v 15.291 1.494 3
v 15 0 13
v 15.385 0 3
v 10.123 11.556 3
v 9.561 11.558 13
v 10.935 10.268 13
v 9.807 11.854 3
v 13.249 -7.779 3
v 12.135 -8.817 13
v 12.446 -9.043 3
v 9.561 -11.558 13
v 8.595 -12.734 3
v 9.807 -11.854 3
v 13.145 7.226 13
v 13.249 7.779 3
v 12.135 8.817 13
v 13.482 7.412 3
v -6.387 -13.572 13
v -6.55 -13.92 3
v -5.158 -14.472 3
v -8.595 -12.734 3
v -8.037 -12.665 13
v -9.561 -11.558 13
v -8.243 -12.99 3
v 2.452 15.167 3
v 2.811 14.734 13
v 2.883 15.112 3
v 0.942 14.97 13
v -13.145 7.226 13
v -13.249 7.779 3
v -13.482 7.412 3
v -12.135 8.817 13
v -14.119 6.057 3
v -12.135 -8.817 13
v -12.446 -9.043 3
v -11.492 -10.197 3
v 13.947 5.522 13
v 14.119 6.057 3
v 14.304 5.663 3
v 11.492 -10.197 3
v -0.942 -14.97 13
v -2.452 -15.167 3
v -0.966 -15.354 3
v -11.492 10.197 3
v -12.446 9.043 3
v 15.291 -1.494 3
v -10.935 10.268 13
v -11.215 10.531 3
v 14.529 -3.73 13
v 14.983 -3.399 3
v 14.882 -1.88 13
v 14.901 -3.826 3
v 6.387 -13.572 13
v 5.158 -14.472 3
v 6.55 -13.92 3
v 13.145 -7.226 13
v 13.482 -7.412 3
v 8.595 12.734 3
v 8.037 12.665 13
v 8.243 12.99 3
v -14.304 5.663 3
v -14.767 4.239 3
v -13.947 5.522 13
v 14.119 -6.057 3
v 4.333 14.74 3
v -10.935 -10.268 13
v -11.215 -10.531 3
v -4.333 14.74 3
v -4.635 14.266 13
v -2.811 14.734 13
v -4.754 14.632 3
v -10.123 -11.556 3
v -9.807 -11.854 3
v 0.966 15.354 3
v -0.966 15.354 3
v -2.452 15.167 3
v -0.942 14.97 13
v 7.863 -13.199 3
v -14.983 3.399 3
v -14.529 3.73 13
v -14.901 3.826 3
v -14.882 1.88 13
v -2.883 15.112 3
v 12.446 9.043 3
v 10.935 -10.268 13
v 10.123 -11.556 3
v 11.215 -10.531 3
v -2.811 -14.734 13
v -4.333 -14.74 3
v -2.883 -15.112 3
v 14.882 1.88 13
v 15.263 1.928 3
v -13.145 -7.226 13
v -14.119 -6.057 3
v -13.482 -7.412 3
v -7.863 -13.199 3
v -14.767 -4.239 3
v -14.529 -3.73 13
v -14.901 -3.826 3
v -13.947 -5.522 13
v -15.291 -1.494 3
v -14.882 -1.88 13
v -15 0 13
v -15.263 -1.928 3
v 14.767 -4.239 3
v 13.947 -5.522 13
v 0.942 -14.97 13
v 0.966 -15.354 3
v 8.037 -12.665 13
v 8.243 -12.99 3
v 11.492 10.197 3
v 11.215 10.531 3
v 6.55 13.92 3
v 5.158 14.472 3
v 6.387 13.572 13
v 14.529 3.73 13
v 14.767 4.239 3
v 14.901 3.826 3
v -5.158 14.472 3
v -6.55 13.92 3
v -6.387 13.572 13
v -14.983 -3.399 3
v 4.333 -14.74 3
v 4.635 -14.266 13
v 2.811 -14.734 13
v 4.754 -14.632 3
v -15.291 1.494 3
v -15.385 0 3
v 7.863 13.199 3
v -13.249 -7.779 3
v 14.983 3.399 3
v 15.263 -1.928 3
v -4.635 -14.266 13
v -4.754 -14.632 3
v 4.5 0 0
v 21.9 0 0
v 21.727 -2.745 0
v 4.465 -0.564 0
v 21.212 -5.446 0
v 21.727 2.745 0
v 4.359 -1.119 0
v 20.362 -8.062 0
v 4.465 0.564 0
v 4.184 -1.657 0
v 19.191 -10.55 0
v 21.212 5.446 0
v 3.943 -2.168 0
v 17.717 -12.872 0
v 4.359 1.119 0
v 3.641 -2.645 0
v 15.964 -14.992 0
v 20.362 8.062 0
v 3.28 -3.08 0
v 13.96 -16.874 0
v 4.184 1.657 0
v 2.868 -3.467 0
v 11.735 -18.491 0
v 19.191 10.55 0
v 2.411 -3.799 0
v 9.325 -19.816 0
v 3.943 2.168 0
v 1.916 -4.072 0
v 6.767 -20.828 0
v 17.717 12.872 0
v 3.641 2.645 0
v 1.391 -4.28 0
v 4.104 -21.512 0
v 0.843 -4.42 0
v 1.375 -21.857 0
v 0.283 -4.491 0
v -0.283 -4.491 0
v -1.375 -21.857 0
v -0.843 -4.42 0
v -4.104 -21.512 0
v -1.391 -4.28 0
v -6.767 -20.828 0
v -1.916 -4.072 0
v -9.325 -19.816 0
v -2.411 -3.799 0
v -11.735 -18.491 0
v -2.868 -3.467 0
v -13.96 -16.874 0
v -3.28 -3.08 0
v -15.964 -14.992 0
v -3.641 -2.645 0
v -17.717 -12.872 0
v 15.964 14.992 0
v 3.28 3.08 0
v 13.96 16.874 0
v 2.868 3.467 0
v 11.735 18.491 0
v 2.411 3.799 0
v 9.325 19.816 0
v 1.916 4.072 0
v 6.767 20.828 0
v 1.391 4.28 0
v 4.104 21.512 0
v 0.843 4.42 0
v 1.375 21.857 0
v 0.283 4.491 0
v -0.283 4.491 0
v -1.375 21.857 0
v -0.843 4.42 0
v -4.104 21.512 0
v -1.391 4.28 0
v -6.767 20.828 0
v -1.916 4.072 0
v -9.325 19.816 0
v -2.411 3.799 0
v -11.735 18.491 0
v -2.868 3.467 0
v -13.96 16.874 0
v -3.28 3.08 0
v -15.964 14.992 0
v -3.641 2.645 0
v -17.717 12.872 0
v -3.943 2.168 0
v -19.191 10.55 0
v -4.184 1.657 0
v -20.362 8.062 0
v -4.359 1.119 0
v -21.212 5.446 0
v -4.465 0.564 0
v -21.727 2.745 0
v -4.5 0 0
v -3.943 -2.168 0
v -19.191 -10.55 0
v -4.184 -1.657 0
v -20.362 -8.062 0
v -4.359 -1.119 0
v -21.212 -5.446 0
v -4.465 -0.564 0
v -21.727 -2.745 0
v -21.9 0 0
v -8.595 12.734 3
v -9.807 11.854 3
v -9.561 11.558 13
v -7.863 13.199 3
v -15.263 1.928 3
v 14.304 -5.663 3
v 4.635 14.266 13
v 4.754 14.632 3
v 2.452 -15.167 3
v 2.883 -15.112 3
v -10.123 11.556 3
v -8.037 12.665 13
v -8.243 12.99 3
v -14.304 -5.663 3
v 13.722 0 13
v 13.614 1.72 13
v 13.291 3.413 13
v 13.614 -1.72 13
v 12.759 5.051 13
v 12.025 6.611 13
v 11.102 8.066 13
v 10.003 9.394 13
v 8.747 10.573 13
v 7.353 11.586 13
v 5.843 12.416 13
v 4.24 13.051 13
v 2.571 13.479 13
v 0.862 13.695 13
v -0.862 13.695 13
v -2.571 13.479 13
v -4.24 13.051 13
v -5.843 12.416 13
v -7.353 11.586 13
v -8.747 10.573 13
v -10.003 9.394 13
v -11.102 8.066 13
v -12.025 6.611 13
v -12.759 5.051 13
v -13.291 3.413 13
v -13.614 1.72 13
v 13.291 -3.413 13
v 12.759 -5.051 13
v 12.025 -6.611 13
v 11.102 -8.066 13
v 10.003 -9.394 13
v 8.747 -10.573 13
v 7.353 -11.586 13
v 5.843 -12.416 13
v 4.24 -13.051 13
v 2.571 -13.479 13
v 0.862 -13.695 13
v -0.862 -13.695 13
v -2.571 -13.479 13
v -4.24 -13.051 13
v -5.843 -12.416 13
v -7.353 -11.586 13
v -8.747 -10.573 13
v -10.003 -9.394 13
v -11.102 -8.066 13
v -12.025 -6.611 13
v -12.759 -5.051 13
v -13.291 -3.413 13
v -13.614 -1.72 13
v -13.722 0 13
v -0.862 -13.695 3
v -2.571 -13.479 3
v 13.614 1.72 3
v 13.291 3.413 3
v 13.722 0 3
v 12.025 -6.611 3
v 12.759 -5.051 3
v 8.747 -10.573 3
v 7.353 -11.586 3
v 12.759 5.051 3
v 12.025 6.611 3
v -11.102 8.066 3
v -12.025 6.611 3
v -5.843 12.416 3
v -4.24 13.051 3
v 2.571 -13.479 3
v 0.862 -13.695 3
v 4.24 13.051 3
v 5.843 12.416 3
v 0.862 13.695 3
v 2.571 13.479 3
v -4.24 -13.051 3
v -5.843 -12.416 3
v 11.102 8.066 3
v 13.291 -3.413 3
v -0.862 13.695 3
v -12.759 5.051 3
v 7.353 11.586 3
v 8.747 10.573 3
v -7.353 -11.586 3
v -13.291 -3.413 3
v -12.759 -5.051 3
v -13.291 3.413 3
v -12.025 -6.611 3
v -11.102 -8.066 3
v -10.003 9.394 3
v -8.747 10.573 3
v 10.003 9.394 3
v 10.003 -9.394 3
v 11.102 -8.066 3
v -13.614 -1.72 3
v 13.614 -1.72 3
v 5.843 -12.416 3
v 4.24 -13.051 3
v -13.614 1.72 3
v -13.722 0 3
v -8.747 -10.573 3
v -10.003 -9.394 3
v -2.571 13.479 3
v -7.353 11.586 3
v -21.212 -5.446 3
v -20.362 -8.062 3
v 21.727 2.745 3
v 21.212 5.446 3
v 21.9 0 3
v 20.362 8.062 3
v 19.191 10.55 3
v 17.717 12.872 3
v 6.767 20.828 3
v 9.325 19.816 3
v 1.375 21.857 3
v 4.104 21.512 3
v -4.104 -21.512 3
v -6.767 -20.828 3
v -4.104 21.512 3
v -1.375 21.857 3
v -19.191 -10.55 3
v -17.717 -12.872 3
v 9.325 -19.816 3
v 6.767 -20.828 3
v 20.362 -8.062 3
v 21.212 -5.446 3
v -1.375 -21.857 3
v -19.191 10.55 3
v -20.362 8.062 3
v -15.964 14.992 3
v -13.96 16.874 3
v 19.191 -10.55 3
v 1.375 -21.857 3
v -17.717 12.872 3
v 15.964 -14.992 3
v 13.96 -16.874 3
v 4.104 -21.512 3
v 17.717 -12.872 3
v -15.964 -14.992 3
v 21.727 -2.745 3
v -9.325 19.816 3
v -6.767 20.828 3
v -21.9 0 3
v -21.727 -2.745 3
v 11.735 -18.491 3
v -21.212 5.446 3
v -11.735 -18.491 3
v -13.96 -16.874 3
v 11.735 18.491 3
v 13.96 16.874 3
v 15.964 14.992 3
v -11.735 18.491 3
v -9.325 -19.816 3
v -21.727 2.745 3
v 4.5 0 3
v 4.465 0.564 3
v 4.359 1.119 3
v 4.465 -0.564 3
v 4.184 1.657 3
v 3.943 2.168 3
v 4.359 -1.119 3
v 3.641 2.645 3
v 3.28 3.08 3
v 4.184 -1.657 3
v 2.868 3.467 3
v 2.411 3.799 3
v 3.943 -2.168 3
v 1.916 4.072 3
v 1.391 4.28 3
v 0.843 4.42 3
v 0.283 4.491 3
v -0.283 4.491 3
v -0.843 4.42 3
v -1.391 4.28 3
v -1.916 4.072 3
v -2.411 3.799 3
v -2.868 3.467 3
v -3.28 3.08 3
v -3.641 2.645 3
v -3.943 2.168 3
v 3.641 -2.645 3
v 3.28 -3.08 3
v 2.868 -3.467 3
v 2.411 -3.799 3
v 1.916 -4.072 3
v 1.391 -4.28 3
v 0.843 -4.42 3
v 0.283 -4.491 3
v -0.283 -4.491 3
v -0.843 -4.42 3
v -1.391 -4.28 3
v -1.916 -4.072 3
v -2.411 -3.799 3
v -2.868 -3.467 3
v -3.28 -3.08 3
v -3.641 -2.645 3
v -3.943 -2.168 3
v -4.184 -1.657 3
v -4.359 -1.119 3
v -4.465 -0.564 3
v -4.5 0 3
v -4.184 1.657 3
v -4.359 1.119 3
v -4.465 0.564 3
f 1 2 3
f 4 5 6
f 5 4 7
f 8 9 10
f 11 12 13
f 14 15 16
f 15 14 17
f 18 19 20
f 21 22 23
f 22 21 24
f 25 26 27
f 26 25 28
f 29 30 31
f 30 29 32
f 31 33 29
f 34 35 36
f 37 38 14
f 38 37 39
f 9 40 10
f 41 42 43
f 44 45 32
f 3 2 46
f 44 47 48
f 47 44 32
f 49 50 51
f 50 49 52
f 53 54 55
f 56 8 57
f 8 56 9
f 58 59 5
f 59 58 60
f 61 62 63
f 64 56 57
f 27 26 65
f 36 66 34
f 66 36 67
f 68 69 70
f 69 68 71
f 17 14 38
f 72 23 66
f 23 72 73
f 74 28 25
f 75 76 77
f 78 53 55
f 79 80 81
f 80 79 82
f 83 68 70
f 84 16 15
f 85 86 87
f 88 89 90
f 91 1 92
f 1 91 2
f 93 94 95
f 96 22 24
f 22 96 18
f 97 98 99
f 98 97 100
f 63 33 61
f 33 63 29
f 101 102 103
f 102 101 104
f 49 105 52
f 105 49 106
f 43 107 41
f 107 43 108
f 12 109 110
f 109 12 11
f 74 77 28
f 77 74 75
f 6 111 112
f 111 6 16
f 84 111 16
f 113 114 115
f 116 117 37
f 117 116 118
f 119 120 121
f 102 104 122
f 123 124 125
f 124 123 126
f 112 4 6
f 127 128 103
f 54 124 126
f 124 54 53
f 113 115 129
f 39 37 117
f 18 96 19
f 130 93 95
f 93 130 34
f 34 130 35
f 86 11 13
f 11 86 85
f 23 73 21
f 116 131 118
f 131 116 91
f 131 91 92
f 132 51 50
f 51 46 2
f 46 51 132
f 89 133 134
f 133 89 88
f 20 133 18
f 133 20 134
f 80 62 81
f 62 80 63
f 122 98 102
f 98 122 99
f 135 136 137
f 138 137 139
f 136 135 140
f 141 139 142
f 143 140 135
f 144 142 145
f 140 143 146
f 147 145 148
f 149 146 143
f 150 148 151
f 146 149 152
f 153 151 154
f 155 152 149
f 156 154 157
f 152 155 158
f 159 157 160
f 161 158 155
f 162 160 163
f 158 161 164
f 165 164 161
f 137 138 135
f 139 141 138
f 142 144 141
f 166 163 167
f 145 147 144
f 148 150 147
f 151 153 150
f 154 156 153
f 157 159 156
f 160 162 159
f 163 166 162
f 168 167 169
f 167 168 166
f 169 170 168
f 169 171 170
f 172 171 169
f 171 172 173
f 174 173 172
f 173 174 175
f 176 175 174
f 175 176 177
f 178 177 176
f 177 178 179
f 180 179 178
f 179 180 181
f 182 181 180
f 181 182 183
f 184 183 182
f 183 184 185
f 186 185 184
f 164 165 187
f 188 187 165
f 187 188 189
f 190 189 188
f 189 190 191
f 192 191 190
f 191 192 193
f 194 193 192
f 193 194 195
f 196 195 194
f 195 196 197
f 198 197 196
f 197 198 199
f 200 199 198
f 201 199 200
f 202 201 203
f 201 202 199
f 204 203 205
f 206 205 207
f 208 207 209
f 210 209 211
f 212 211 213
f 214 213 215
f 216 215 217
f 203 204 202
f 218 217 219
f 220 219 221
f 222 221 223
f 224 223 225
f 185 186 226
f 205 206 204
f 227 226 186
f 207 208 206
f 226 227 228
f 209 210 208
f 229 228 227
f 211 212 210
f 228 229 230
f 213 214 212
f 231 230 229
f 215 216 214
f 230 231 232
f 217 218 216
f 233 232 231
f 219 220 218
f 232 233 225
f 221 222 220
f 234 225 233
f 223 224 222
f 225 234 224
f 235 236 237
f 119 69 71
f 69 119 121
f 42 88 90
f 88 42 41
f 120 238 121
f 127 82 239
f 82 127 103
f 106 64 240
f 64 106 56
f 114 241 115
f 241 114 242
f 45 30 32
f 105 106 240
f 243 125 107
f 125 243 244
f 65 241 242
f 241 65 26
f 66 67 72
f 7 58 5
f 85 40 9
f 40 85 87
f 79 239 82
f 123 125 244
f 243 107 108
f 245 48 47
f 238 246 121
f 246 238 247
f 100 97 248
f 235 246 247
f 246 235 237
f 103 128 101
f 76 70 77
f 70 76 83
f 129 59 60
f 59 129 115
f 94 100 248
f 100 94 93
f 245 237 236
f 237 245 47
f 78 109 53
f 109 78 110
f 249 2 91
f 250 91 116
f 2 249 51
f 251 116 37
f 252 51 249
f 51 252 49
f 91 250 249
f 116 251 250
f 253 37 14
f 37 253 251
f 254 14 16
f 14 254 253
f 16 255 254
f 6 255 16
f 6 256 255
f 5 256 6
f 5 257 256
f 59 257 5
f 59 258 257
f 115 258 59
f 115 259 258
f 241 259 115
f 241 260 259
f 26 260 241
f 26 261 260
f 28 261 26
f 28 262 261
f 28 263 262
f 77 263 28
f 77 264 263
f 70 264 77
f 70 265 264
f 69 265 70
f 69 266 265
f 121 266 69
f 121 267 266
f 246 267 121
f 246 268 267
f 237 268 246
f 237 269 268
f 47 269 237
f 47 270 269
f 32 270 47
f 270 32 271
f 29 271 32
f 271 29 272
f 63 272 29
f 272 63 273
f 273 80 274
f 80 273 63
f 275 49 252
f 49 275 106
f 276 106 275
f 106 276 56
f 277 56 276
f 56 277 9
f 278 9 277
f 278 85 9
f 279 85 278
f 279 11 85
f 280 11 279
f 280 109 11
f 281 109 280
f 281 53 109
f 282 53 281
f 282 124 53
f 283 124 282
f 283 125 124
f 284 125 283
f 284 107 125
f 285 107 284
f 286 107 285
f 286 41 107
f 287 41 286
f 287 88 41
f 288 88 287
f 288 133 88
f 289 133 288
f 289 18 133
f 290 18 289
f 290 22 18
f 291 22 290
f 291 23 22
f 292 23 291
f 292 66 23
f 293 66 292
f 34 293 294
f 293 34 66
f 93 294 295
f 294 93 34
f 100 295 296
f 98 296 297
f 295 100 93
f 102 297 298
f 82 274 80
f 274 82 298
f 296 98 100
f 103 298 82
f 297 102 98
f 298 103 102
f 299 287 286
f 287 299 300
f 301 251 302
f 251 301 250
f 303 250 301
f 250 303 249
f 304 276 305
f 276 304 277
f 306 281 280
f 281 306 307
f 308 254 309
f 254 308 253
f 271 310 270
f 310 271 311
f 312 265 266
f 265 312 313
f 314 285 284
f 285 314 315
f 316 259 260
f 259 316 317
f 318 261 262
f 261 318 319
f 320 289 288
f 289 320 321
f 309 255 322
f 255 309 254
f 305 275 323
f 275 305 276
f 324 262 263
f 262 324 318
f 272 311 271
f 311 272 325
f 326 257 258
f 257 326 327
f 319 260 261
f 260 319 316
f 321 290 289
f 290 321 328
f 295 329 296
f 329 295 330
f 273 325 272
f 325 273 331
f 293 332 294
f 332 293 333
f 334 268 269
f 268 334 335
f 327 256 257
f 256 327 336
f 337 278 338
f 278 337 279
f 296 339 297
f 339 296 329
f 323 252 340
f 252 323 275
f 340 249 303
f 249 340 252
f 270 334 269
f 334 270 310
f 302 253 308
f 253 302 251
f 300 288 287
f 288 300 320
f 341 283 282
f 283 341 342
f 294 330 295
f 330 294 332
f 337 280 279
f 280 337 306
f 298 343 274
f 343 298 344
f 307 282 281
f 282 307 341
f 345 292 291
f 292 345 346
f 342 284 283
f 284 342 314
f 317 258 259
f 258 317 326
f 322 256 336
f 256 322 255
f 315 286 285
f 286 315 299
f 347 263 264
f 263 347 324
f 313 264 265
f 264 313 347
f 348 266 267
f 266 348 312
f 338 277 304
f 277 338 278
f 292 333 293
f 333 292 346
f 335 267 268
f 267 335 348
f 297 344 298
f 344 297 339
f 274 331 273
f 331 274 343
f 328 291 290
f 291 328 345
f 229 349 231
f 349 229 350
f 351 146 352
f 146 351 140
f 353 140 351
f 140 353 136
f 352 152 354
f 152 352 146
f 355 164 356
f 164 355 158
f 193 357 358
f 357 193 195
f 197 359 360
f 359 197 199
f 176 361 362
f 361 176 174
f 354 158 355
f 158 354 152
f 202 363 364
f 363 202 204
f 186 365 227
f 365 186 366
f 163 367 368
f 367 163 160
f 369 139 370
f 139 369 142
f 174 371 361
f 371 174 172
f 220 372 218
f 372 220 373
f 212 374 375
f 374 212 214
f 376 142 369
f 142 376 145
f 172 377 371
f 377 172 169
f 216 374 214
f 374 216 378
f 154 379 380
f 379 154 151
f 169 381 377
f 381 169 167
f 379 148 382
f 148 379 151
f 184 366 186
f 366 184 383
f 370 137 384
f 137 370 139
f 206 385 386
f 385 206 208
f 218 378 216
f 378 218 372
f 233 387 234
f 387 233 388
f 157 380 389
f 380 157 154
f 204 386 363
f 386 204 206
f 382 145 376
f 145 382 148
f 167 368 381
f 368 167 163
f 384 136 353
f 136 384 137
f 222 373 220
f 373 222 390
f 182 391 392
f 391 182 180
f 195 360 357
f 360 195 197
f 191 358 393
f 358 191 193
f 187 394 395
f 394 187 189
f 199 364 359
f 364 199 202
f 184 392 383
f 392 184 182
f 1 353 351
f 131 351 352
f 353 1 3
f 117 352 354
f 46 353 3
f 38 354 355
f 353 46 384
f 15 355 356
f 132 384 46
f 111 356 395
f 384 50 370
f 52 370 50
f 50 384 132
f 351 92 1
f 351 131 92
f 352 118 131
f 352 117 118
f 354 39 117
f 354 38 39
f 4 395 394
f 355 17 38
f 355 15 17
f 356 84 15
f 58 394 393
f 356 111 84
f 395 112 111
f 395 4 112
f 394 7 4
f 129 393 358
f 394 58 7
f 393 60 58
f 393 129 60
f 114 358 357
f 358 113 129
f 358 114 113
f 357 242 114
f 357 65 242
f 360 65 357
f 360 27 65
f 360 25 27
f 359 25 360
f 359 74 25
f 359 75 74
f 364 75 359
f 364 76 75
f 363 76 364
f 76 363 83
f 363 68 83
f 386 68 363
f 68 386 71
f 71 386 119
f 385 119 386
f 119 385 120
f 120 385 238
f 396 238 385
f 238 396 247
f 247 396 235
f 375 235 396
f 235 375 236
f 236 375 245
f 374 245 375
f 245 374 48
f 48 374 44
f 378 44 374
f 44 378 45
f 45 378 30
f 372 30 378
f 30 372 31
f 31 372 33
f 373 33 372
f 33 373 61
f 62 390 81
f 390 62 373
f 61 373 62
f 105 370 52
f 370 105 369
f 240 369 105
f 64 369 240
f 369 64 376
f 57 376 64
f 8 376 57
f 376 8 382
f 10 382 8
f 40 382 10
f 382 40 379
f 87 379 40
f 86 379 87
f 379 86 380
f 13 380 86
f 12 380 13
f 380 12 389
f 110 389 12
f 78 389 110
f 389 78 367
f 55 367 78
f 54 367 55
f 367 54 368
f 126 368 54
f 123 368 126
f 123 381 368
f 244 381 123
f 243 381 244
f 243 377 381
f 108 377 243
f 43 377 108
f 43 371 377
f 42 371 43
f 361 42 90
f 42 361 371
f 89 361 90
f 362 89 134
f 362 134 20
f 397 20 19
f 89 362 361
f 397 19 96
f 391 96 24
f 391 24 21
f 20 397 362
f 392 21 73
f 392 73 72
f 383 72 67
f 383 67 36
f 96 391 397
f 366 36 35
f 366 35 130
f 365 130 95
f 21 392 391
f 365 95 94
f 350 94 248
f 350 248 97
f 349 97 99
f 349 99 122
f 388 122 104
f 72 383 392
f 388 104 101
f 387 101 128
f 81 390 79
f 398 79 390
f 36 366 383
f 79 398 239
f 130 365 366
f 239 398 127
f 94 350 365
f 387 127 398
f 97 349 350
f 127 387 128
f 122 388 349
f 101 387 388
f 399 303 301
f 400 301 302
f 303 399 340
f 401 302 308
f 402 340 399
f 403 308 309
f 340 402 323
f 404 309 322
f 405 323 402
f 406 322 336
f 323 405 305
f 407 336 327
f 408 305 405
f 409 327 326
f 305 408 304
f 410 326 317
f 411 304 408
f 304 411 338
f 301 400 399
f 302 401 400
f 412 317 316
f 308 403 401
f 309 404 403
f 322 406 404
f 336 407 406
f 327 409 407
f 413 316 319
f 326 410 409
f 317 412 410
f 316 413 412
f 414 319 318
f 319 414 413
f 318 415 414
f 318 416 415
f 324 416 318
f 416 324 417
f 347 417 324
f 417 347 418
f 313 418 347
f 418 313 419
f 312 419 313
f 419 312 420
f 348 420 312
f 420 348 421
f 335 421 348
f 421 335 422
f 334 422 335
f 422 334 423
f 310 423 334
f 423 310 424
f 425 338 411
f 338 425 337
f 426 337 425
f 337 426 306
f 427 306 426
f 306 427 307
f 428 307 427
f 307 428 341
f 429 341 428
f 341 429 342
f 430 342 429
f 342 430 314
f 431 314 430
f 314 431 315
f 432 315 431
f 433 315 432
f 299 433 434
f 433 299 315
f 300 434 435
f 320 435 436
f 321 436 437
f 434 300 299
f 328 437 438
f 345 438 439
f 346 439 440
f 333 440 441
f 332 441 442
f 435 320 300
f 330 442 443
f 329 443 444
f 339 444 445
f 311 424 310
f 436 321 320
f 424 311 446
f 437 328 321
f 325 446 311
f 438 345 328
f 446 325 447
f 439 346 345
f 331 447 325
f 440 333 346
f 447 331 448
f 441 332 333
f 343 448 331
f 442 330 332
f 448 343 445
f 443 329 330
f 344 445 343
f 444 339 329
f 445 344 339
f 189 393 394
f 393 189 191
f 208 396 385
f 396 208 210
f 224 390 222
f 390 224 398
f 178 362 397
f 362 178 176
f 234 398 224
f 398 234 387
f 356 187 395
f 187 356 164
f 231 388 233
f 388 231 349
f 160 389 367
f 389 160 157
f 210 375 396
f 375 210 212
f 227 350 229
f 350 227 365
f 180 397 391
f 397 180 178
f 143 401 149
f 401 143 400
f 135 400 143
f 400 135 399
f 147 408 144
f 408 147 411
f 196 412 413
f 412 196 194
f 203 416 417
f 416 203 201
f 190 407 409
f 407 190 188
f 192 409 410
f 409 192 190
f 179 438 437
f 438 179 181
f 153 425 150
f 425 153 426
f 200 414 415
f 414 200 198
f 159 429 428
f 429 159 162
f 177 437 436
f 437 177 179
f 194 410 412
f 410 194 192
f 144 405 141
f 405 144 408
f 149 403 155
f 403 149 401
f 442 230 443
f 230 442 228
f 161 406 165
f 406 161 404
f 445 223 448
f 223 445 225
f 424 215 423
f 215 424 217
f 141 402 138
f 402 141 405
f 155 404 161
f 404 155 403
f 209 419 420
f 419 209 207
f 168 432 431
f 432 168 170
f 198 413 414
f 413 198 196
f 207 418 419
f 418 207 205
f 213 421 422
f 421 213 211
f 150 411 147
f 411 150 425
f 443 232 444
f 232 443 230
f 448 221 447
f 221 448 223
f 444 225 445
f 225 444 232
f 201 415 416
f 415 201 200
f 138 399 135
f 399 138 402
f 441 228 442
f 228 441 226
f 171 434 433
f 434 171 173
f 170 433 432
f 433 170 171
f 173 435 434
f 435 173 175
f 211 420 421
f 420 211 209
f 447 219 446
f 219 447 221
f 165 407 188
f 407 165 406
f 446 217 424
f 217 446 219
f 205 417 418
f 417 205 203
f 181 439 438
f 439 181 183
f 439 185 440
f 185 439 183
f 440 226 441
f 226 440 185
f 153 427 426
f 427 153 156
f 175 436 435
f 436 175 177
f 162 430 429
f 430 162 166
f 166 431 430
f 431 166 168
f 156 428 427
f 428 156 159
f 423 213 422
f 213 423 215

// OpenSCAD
// Parametric filament spool bushing 
// http://www.thingiverse.com/thing:288144
// Design by Kyle Randall "3D-ME"
//1-20-15; fixed bug on Customizer app to let users select the number of bushings made, thanks esquehill for catching that!

// Adjust the following parameters:
spool_hole=32;//set this to equal your spool's hole size
rod_hole=8;//set this to the size of the rod that you are using as an axis for the spool
retainer_height=13;//you can add a number here//height of the inner cylinder
resolution=50;//resolution of the model
lip_height=3;//thickness of the outer lip
bushings=1; //[1,2]
//number of bushings to render (one or two)
// If you wish for any more customizable parameters, ask on the coments here: http://www.thingiverse.com/thing:288144/#comments
////////Don't edit the following unless you know what you're doing/////////
module bushing(){//this is our bushing 
	difference(){
		union(){
			difference(){	
				cylinder(r1=spool_hole/2-0.5,r2=spool_hole/2-1,h=retainer_height,$fn=resolution);
				cylinder(r=spool_hole/2-spool_hole/18-0.5,h=retainer_height,$fn=resolution);}
			cylinder(r=spool_hole/2+spool_hole/5-0.5,h=lip_height,$fn=resolution);
		}
		cylinder(r=rod_hole/2+0.5,h=lip_height+2,$fn=resolution);
	}
}
module two(){//this is a bushing placed to the right of the other one
	translate([spool_hole*1.5,0,0]){
		bushing();
	}
}
bushing();//calling the first bushing 
if (bushings==2) two();//and the second if true
